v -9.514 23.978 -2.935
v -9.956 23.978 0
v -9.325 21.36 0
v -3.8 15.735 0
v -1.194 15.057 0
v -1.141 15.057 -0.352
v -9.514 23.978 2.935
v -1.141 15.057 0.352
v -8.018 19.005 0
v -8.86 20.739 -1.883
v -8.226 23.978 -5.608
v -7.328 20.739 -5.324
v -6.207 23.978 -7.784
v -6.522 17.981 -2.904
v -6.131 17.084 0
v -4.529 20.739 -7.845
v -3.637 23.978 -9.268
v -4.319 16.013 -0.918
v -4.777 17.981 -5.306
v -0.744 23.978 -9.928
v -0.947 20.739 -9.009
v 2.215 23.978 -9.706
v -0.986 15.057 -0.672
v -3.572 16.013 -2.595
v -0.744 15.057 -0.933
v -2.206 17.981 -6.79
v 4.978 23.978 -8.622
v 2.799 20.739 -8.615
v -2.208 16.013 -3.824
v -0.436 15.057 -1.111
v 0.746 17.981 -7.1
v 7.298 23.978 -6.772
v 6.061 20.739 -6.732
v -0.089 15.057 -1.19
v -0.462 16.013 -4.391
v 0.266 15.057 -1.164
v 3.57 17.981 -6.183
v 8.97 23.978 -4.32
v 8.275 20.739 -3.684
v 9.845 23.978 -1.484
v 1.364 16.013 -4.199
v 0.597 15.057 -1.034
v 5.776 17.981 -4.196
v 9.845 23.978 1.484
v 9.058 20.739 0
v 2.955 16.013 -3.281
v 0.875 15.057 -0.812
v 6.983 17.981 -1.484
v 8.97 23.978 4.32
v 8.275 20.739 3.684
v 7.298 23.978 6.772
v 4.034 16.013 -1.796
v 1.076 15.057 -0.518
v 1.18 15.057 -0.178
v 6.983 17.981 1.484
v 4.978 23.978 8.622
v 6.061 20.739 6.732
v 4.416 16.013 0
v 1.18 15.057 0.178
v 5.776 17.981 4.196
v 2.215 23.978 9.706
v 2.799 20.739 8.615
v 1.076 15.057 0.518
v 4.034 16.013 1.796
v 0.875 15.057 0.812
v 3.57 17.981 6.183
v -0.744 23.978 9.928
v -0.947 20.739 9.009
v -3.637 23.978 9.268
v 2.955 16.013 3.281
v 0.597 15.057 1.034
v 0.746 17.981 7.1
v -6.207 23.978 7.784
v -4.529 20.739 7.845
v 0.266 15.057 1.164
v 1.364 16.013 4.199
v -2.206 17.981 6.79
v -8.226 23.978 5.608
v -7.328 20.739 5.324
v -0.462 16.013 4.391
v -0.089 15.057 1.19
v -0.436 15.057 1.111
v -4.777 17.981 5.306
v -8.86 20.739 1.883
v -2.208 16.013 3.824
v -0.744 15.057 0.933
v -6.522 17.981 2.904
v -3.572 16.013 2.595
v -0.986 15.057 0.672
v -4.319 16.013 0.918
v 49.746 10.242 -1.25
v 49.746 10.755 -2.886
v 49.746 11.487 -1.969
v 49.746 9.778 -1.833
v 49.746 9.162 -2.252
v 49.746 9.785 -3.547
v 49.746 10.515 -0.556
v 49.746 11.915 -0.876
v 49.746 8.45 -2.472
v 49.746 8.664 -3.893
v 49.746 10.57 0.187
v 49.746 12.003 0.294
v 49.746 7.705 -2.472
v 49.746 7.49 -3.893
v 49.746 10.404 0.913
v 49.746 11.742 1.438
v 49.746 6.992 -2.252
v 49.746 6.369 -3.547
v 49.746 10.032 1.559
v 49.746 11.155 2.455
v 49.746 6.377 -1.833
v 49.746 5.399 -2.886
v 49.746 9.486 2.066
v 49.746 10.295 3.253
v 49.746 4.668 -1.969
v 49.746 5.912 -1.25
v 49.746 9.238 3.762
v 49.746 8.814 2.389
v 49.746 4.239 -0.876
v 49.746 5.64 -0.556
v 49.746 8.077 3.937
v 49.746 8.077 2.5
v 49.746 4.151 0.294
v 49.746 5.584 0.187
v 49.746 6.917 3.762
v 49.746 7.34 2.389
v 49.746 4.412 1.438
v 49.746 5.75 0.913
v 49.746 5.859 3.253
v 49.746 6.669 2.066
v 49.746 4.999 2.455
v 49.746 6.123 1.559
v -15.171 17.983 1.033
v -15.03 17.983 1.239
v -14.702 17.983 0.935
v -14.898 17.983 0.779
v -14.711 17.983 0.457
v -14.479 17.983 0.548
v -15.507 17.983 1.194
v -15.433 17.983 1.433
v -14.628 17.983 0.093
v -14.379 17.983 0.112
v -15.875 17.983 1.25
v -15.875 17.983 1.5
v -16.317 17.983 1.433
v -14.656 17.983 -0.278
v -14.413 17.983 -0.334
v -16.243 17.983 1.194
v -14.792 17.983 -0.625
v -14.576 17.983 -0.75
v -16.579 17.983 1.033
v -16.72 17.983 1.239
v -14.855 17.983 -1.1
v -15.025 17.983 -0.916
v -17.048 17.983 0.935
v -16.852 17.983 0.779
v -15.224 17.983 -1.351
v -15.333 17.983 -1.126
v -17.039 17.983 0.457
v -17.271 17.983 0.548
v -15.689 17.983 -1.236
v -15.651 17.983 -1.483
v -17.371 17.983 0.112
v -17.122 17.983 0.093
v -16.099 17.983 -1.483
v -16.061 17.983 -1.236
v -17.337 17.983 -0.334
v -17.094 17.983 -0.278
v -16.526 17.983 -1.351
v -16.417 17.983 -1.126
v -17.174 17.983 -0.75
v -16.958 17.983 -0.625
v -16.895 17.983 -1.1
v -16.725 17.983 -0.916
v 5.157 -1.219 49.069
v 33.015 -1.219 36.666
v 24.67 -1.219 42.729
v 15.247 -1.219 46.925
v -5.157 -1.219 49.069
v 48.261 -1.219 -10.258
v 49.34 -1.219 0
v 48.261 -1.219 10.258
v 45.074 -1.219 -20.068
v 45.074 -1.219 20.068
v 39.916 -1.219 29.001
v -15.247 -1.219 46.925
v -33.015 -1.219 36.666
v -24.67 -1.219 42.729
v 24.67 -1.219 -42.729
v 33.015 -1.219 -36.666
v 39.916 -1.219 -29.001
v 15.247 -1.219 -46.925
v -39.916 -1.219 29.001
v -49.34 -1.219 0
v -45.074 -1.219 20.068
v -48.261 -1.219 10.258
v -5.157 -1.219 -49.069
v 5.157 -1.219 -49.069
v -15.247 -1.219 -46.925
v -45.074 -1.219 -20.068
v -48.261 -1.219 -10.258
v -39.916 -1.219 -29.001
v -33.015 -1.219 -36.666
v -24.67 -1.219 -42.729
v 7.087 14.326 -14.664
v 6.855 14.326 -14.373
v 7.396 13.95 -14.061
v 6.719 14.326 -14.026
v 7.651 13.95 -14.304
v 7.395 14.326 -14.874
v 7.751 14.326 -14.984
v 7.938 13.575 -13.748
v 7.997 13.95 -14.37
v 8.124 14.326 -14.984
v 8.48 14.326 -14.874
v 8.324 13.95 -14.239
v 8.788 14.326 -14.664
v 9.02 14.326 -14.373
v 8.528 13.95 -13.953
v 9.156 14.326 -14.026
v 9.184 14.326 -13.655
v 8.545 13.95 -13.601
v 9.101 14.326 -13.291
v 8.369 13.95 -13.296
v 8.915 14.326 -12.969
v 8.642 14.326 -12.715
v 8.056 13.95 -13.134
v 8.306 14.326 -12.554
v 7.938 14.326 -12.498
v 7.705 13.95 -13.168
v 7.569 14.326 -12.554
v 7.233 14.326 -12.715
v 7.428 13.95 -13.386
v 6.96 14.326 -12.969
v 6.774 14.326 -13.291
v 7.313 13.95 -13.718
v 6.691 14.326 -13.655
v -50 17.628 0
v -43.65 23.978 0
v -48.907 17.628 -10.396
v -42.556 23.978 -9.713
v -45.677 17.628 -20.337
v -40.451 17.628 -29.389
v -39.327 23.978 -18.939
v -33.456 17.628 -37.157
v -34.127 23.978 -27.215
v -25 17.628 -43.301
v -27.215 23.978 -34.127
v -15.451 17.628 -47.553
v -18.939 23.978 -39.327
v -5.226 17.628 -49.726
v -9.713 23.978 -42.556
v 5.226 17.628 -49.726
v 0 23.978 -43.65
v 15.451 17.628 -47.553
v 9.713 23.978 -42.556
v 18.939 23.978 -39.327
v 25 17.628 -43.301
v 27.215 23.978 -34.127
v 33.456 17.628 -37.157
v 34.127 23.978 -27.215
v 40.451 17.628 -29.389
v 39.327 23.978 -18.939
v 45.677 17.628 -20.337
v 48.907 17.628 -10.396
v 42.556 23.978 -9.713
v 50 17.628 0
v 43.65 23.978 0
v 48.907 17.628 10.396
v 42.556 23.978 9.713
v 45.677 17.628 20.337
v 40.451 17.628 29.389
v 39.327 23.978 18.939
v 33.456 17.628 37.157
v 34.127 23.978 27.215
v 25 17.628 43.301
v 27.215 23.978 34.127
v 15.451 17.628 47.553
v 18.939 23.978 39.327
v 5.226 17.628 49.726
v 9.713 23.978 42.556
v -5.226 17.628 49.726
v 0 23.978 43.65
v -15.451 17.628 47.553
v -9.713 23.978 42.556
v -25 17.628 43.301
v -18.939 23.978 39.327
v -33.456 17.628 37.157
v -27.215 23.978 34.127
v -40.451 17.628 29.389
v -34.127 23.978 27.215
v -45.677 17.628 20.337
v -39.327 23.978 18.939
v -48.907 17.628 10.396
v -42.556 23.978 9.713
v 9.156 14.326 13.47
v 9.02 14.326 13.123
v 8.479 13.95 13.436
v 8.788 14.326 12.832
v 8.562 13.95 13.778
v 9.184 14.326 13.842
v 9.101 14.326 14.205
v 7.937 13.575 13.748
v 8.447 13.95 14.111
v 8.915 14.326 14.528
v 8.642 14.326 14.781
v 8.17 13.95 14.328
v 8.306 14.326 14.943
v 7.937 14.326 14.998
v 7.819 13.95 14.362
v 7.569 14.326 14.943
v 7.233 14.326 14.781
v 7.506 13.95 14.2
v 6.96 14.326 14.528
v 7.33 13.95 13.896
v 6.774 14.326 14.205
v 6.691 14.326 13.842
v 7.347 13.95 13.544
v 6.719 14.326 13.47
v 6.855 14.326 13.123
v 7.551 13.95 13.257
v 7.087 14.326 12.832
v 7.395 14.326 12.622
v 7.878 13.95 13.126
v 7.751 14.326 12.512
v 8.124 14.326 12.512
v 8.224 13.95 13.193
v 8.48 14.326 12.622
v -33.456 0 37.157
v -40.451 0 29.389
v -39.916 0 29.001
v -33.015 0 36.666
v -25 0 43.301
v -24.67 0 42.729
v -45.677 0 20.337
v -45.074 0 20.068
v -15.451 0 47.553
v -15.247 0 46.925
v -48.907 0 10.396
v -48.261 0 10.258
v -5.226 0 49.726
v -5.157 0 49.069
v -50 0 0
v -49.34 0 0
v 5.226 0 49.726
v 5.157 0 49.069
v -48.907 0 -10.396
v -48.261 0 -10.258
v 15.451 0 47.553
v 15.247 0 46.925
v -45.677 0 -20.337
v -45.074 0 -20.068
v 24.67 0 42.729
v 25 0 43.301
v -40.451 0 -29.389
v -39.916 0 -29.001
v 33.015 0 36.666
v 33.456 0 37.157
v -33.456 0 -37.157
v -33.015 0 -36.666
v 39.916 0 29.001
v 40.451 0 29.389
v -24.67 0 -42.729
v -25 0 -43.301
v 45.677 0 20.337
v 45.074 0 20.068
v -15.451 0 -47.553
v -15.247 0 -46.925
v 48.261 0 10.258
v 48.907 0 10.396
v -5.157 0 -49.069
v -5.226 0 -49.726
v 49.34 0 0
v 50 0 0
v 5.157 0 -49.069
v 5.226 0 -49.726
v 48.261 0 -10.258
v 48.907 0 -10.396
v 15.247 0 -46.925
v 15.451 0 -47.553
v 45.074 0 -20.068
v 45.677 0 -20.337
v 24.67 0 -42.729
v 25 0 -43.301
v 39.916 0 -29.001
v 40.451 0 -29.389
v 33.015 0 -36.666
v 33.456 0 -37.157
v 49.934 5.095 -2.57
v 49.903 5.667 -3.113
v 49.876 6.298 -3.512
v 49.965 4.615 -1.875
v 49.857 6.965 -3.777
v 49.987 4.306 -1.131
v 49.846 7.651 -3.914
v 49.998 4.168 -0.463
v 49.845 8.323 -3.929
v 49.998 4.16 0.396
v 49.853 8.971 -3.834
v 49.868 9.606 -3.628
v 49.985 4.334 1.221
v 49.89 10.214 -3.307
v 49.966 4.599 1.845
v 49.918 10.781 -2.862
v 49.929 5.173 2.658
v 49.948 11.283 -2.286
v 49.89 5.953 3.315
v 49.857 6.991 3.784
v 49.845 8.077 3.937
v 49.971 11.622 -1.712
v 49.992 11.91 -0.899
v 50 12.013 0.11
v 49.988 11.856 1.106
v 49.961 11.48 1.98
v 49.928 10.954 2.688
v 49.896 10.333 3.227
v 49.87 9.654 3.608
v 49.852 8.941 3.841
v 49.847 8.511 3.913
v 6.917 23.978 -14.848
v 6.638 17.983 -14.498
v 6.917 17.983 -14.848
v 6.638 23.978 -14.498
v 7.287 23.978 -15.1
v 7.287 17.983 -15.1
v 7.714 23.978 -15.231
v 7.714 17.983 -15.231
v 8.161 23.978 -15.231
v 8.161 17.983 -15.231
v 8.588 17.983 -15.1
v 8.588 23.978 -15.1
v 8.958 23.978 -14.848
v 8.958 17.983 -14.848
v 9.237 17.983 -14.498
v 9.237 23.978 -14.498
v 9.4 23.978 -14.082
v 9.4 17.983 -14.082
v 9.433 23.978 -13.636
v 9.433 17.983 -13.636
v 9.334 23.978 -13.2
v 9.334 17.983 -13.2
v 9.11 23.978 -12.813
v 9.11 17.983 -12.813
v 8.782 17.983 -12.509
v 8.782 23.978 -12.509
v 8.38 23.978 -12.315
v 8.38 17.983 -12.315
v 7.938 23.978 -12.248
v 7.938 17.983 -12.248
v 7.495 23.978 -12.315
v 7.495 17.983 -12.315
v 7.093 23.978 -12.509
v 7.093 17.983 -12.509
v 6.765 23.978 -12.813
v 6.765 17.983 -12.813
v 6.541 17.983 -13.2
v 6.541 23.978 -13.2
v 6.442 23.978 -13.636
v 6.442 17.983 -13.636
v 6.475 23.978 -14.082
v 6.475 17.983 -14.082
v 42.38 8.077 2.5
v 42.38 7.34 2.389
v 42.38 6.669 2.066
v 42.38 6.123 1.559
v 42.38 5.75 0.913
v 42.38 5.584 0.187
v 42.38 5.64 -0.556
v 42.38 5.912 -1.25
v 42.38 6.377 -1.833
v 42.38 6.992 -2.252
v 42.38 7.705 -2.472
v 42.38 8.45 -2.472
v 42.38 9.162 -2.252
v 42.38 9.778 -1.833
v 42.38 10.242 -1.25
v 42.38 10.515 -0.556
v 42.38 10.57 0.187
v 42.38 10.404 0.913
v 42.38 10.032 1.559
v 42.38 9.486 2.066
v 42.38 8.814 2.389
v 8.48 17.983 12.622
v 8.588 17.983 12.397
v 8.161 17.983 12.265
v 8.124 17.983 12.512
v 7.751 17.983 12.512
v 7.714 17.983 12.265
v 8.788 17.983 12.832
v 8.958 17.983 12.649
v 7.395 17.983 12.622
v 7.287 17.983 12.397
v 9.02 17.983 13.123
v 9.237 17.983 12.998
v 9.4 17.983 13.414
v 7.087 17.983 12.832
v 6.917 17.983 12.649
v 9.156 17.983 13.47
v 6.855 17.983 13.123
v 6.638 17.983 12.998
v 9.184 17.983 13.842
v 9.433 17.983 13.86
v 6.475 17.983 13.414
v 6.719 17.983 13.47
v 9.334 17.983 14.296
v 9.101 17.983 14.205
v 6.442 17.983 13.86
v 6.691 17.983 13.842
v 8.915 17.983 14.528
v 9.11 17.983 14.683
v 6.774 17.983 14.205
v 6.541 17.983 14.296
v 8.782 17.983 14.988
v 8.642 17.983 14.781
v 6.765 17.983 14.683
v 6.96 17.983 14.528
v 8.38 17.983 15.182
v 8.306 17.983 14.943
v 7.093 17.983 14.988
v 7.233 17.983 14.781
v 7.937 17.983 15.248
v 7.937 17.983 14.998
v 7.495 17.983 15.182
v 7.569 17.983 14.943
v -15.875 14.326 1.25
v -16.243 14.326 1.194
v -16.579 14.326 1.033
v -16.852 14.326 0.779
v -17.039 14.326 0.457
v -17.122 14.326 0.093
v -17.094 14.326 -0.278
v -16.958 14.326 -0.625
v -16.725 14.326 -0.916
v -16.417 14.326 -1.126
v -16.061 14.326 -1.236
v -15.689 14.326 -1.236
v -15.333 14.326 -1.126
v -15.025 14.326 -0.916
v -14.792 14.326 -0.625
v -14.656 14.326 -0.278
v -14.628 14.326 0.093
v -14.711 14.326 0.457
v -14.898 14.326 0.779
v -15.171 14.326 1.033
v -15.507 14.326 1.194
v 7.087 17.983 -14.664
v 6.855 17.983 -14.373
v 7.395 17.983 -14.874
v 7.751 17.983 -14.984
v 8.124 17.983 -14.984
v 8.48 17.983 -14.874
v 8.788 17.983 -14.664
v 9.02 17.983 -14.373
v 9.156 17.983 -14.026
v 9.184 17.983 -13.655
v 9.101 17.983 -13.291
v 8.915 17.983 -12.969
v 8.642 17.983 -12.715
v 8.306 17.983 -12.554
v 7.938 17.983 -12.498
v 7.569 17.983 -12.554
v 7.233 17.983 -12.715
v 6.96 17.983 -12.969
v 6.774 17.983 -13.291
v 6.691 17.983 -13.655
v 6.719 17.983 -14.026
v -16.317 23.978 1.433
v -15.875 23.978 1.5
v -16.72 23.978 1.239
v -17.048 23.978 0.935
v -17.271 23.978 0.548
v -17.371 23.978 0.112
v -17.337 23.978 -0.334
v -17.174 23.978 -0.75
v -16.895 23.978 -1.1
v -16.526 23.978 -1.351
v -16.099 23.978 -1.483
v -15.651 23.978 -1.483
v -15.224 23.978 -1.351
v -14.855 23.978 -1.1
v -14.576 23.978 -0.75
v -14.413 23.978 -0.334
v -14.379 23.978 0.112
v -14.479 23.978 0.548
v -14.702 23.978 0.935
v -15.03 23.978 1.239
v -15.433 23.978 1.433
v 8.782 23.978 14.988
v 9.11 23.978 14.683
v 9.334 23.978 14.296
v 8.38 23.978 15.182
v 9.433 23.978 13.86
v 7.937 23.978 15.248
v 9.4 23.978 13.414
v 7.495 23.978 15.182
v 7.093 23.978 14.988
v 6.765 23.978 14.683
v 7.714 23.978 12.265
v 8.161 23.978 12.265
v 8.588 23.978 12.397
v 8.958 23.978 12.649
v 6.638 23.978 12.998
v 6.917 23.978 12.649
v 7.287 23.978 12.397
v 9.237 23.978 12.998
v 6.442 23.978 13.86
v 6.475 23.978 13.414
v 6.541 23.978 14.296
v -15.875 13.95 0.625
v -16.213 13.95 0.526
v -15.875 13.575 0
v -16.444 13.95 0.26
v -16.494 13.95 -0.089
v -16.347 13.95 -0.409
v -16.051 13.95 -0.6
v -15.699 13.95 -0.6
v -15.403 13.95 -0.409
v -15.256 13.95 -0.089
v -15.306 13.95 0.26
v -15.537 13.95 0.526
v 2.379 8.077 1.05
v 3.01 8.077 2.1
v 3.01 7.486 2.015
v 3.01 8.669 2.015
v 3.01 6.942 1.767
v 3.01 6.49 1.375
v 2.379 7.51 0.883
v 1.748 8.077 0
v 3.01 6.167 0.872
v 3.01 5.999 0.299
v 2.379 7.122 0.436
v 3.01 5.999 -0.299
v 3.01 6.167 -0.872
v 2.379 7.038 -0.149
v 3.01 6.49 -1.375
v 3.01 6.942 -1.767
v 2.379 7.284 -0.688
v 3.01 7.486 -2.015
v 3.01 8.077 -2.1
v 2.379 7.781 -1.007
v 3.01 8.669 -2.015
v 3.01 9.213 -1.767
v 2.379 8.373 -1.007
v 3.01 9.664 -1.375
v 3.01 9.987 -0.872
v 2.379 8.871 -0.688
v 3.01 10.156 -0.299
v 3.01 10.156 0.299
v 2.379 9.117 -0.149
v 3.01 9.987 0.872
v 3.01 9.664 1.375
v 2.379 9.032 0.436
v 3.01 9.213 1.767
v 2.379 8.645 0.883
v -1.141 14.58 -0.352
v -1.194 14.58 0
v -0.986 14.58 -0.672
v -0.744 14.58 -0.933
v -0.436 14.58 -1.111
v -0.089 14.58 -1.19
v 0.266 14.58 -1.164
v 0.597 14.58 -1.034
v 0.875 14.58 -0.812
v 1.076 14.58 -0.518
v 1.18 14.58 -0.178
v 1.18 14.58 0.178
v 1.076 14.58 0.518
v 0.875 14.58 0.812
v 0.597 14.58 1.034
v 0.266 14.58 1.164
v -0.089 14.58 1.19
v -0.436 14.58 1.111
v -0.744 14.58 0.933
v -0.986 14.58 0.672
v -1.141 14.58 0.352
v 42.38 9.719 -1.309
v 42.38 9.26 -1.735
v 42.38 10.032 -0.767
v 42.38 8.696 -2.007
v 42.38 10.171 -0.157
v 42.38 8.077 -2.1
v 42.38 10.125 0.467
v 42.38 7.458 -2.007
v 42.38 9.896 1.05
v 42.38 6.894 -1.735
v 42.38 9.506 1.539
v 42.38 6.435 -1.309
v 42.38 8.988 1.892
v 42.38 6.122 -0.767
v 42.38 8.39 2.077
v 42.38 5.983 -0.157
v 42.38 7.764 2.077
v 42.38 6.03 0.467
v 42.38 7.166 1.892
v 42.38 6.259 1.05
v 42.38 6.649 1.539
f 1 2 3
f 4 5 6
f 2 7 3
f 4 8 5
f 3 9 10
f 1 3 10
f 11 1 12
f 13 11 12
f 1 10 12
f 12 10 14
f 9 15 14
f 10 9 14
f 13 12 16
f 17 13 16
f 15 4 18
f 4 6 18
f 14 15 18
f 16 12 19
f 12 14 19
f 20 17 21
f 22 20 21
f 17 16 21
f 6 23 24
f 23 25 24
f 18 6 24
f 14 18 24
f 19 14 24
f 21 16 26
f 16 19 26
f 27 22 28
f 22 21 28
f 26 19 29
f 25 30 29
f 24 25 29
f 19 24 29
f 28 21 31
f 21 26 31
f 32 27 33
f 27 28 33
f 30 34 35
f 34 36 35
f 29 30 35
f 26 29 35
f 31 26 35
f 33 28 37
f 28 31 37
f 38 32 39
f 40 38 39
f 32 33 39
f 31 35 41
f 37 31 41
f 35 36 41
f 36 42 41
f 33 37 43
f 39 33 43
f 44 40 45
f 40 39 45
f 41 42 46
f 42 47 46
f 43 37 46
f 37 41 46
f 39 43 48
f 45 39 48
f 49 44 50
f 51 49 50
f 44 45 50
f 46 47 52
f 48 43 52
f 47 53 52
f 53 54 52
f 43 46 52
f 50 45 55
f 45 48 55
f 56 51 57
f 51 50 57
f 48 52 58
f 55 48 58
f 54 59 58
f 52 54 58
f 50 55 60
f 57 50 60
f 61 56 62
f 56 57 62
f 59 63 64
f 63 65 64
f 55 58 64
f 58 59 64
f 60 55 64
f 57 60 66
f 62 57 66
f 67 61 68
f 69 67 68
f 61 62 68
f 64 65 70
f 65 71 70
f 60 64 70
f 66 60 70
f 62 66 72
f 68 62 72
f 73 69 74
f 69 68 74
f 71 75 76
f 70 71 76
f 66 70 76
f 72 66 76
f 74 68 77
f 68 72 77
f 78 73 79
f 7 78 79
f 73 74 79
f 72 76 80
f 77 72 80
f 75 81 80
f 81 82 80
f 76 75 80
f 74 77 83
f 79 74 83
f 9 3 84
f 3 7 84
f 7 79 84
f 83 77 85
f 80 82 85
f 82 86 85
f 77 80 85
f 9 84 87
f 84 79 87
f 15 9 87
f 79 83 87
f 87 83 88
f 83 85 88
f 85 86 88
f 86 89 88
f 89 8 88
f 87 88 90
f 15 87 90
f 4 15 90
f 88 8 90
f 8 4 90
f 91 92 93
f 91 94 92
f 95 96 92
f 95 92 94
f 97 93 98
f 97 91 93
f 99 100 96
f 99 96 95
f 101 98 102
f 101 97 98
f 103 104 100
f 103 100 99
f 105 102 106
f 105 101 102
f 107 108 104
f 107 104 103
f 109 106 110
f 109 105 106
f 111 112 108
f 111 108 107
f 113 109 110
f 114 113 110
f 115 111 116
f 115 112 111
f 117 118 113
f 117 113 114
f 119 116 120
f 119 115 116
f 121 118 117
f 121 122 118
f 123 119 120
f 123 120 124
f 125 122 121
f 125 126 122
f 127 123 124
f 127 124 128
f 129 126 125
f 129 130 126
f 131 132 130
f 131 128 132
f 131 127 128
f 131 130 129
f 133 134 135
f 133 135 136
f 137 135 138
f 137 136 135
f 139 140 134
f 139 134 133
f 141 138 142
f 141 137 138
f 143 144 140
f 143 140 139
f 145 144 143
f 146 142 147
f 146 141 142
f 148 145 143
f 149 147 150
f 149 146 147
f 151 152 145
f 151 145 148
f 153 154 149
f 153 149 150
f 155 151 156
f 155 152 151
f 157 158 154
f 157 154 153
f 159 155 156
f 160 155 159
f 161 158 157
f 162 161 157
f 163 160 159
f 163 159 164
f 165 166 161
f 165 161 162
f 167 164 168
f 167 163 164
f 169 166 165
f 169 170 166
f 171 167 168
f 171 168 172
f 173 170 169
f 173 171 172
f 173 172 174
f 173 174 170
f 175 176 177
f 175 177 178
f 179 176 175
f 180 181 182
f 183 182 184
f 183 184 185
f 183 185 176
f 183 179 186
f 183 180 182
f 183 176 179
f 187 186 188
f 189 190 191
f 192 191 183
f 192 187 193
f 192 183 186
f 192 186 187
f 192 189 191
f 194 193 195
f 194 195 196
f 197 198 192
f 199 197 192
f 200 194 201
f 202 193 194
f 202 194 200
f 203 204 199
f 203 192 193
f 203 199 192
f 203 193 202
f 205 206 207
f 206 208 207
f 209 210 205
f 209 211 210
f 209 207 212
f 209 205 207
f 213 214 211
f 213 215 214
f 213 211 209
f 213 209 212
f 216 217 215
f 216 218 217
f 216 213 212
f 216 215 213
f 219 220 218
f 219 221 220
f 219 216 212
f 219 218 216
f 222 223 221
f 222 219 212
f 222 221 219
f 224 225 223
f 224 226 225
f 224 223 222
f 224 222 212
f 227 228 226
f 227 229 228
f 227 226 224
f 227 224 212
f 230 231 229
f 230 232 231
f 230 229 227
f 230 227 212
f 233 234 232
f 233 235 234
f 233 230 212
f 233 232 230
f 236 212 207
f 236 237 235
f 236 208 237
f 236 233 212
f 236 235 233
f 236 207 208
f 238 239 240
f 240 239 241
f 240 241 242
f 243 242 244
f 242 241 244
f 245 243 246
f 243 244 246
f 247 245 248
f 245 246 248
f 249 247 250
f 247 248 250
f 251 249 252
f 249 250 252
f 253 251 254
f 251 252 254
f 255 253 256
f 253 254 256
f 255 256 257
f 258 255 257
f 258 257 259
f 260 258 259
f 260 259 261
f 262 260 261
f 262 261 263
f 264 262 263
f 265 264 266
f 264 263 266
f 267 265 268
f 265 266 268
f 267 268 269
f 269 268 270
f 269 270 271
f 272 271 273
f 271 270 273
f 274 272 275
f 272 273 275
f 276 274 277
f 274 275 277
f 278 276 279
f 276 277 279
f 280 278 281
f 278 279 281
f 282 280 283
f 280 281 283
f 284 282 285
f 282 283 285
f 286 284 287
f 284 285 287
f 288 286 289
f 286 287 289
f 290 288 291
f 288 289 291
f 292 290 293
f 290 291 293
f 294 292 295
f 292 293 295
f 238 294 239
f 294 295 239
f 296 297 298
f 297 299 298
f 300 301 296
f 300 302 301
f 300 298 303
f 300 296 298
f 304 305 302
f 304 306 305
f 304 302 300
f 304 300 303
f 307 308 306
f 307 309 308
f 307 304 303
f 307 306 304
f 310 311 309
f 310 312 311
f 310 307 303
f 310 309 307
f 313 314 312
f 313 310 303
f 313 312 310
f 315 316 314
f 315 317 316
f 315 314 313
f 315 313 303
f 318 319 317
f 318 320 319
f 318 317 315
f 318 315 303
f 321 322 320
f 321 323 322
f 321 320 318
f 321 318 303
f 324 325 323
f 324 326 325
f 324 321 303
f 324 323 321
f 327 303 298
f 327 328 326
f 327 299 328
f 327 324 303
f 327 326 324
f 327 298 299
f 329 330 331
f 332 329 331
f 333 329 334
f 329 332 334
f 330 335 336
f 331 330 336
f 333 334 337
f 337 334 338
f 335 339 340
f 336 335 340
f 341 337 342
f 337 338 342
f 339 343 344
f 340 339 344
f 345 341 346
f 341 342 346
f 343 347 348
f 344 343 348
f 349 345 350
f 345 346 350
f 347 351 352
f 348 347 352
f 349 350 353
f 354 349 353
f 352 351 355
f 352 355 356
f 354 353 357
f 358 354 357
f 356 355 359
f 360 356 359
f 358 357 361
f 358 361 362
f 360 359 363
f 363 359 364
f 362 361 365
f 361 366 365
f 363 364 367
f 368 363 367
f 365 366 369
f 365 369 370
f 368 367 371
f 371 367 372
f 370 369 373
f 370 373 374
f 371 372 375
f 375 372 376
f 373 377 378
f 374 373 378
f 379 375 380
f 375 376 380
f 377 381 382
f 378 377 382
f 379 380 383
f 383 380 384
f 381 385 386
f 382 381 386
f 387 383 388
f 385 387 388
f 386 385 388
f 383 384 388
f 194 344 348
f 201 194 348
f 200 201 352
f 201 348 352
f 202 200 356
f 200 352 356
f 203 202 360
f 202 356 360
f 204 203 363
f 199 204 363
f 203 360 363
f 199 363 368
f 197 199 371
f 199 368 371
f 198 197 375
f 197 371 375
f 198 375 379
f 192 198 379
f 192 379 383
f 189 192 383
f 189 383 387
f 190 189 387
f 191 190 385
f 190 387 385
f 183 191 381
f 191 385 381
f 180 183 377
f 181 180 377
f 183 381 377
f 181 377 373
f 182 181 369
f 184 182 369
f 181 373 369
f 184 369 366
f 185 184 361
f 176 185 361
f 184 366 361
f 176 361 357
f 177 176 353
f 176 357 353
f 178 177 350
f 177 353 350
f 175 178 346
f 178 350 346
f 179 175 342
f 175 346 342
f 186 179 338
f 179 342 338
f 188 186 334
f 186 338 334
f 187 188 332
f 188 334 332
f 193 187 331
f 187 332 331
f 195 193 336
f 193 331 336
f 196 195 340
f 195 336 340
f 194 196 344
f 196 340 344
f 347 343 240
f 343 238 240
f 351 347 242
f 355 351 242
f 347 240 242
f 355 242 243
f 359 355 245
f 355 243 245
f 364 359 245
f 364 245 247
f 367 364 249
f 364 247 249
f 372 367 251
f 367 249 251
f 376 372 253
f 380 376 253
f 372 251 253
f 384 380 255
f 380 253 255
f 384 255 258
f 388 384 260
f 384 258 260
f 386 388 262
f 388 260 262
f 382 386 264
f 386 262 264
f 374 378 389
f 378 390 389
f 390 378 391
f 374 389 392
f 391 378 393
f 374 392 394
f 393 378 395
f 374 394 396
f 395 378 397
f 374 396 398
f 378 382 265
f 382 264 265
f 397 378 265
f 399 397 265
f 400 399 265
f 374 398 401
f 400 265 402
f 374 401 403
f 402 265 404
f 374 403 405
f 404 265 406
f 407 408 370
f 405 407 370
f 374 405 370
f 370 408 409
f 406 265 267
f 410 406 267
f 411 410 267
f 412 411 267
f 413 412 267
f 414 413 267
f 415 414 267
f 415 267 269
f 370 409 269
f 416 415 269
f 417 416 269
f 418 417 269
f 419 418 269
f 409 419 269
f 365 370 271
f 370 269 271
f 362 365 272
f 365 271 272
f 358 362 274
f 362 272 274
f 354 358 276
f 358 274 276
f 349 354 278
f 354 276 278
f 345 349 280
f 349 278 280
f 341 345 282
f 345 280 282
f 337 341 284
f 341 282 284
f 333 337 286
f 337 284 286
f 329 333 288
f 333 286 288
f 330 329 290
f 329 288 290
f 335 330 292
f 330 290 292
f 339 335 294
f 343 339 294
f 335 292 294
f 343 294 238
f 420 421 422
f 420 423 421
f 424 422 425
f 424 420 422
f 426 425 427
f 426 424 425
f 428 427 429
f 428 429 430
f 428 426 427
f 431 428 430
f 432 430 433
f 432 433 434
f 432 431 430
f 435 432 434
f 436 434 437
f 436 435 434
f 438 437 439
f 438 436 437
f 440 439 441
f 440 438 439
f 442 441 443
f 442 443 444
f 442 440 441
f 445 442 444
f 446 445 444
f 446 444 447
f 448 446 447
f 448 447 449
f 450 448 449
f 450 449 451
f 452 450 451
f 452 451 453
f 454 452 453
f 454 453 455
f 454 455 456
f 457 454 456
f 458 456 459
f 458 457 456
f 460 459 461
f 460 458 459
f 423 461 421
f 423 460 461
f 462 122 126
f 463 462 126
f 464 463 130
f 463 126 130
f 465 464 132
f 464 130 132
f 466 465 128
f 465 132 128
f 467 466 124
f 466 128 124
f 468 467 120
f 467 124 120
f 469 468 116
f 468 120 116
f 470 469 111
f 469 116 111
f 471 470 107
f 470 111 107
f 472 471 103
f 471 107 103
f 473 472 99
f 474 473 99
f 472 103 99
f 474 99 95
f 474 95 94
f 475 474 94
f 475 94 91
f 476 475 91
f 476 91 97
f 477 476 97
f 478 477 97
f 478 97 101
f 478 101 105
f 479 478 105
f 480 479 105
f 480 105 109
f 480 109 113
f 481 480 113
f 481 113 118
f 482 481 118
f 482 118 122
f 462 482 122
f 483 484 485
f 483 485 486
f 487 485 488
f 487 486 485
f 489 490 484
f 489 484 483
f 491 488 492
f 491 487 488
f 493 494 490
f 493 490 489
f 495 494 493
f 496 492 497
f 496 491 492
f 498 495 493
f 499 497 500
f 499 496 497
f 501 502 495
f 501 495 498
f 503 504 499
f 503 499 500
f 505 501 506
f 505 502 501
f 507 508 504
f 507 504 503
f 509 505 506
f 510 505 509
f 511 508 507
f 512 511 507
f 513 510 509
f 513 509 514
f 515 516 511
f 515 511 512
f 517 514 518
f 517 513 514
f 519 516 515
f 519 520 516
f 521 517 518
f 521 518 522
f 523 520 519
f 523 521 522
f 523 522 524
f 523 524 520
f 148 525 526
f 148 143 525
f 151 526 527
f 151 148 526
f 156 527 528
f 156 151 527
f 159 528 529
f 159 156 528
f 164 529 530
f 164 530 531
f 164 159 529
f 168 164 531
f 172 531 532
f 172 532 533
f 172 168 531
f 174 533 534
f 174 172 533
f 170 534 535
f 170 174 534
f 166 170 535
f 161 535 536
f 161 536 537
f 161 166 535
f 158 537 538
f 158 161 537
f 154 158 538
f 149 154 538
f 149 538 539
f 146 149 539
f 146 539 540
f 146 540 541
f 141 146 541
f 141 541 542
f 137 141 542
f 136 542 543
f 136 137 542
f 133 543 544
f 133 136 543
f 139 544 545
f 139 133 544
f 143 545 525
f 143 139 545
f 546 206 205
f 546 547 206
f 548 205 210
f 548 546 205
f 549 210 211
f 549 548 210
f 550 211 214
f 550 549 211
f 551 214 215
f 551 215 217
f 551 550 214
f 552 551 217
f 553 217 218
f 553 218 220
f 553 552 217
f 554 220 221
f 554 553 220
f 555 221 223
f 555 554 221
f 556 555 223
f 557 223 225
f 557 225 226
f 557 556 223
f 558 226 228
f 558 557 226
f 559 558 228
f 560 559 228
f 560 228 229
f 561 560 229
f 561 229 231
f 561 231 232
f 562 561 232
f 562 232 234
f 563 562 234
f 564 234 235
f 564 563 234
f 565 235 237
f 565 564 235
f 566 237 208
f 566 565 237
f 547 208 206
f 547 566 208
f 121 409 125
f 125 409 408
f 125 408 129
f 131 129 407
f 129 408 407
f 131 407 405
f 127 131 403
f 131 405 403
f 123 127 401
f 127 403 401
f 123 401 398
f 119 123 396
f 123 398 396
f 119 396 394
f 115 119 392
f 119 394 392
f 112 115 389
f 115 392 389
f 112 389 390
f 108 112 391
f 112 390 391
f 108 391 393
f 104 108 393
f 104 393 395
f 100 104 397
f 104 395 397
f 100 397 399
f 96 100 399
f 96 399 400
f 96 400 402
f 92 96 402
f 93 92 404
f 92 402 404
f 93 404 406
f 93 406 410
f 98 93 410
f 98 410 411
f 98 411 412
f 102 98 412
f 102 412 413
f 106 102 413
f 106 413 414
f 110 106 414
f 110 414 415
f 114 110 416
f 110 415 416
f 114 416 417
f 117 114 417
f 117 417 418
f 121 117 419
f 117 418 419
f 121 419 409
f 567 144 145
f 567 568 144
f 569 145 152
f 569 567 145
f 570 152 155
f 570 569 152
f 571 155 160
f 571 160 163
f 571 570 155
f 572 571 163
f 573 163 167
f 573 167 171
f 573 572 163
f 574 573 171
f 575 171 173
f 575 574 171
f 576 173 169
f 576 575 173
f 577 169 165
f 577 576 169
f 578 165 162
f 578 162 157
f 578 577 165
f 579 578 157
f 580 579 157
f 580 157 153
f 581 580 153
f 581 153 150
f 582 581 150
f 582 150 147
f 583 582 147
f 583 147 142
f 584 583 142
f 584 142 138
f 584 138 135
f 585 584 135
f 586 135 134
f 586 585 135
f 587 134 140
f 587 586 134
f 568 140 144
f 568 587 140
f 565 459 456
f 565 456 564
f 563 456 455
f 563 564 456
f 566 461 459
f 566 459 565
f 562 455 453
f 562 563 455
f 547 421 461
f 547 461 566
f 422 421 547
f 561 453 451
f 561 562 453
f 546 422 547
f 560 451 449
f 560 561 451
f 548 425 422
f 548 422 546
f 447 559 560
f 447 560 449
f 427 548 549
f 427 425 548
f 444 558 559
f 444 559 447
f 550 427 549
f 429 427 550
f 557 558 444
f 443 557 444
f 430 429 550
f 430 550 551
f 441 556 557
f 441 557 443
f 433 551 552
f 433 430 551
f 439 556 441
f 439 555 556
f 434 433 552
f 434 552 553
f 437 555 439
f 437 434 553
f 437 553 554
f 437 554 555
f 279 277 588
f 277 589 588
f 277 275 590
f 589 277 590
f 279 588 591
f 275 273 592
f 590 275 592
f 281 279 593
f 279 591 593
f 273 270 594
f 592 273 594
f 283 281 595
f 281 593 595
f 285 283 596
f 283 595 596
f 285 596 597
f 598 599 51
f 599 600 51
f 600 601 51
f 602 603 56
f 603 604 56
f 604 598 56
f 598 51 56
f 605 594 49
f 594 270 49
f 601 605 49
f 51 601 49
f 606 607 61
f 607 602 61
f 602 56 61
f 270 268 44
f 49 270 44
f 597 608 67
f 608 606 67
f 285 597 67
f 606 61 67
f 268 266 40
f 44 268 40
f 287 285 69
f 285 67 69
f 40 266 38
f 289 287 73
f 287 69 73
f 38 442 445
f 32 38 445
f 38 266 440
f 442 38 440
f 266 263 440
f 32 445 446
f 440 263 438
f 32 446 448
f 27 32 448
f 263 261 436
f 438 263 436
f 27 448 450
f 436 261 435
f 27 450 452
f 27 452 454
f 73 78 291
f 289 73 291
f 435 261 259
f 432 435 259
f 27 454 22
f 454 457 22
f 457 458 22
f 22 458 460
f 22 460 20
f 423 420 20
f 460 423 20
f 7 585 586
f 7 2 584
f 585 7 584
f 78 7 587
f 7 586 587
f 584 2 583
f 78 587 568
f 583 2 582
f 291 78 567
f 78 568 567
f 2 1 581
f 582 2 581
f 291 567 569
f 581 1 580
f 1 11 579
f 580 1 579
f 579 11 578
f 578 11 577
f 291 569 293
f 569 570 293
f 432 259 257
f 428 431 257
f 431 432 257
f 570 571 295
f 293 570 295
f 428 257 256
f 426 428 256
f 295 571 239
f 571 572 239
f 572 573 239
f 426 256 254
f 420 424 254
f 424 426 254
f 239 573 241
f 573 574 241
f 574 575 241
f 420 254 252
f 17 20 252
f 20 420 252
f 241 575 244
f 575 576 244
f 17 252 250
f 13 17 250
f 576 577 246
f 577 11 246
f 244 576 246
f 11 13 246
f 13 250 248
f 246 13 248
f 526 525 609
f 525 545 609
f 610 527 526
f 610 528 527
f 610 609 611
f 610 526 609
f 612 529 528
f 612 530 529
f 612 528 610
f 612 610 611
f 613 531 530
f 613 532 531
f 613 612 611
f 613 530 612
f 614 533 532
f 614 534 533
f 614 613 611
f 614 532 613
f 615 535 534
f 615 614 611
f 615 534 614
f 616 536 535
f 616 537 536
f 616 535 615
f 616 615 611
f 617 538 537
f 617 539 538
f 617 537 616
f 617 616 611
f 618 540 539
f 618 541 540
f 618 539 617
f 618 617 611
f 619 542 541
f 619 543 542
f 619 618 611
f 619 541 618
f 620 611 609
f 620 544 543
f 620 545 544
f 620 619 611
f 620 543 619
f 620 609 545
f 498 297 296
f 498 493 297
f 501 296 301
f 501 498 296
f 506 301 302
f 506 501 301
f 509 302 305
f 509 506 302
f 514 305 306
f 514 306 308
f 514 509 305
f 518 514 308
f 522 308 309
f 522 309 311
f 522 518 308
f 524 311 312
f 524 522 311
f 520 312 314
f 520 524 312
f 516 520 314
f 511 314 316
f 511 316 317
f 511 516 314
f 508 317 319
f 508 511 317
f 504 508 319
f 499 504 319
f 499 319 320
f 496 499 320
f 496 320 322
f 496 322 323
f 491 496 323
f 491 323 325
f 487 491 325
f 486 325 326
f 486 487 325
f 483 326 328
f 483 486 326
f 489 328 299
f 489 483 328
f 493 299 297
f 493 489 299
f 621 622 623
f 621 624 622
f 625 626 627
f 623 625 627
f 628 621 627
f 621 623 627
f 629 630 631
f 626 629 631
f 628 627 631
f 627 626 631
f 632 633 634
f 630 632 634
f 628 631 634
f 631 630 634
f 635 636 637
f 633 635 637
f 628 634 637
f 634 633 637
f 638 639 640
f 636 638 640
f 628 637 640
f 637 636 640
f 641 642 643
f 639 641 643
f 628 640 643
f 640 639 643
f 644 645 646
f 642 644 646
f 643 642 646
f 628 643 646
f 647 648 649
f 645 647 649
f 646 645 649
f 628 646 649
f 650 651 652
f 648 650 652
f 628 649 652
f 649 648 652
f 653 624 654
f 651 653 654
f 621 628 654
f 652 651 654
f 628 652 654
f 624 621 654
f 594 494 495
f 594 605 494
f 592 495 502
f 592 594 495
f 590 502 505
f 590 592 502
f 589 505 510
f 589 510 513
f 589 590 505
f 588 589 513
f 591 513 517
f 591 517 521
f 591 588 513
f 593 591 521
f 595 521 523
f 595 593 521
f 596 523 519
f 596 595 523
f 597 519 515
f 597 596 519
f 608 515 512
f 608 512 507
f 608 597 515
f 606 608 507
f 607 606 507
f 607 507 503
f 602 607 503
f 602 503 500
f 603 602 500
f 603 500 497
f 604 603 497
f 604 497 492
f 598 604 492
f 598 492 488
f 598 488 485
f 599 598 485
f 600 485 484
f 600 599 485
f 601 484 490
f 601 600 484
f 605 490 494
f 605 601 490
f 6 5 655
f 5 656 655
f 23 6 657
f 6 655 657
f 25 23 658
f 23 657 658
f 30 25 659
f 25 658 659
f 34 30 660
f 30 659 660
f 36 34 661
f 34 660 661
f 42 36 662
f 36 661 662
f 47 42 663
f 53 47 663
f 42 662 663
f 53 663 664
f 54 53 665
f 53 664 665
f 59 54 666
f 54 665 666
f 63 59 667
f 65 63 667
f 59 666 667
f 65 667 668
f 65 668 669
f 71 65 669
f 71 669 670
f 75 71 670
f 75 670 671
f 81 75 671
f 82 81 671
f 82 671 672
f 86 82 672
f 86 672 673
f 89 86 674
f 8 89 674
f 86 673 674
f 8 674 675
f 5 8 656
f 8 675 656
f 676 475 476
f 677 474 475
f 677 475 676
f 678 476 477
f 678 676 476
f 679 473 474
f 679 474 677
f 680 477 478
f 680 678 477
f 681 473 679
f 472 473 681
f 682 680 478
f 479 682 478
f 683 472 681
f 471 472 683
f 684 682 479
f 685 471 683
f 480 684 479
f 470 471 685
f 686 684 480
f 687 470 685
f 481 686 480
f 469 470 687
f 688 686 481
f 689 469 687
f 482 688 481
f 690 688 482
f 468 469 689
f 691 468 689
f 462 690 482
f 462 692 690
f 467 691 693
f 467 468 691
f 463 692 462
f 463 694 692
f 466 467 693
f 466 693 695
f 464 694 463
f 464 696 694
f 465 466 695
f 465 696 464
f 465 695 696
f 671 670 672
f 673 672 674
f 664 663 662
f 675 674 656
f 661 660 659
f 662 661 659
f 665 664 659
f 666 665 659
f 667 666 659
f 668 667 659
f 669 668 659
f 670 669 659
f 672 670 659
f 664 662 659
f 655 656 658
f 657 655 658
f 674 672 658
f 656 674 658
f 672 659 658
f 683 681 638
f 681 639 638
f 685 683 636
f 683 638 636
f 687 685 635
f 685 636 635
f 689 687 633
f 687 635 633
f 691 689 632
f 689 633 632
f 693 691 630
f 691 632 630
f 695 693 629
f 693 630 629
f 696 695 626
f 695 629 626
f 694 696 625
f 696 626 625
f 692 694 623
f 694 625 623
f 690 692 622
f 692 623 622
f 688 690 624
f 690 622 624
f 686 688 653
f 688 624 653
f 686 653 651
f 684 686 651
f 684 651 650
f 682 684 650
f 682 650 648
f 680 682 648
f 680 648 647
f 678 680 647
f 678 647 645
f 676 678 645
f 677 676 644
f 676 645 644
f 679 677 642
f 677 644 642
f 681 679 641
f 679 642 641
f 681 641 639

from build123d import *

# Parameters (mm, degrees)
M5X0_8_TAPPED_HOLE1_D                               = 4.2
M5X0_8_TAPPED_HOLE1_DEPTH                           = 46.99
M5X0_8_TAPPED_HOLE1_CBORE_D                         = 5
M5X0_8_TAPPED_HOLE1_CBORE_DEPTH                     = 7.62
M5X0_8_TAPPED_HOLE1_TIP                             = 1.2618073
CIRPATTERN1_COUNT                                   = 3
CBORE_FOR_00_BINDING_HEAD_MACHINE_SCREW_D           = 1.397
CBORE_FOR_00_BINDING_HEAD_MACHINE_SCREW_DEPTH       = 6.35
CBORE_FOR_00_BINDING_HEAD_MACHINE_SCREW_CBORE_D     = 7.874
CBORE_FOR_00_BINDING_HEAD_MACHINE_SCREW_CBORE_DEPTH = 0.254
CBORE_FOR_00_BINDING_HEAD_MACHINE_SCREW_TIP         = 0.419701142
SKETCH2_R                                           = 49.3395
EXTRUDE1_DEPTH                                      = 1.2192


with BuildPart() as part:
    # Sketch1 → Revolve1 (revolve)
    with BuildSketch(Plane.XY, mode=Mode.PRIVATE) as revolve1_sk:
        with BuildLine():
            Line((0, 0), (49.9999, 0))
            Line((49.9999, 0), (49.9999, 17.6276))
            Line((49.9999, 17.6276), (43.6499, 23.9776))
            Line((43.6499, 23.9776), (9.955892816, 23.9776))
            ThreePointArc((9.955892816, 23.9776), (7.139407653, 17.980689326), (1.1938, 15.057458932))
            Line((1.1938, 15.057458932), (1.1938, 14.5796))
            Line((1.1938, 14.5796), (0, 14.5796))
            Line((0, 14.5796), (0, 0))
        make_face()
    revolve(revolve1_sk.sketch.rotate(Axis((0, 23.9776, 0), (0, -1, 0)), 180), axis=Axis((0, 23.9776, 0), (0, -1, 0)))  # turned: the seam where the file's is

    # M5x0.8 Tapped Hole1
    with Locations(Plane(origin=(49.9999, 8.0772, 0), x_dir=(0, 0, 1), z_dir=(1, 0, 0))):
        with Locations((0, 0)):
            CounterBoreHole(M5X0_8_TAPPED_HOLE1_D / 2, M5X0_8_TAPPED_HOLE1_CBORE_D / 2, M5X0_8_TAPPED_HOLE1_CBORE_DEPTH, depth=M5X0_8_TAPPED_HOLE1_DEPTH)
            with Locations((0, 0, -(M5X0_8_TAPPED_HOLE1_DEPTH + M5X0_8_TAPPED_HOLE1_TIP / 2))):  # 118° drill point
                Cone(0, M5X0_8_TAPPED_HOLE1_D / 2, M5X0_8_TAPPED_HOLE1_TIP, mode=Mode.SUBTRACT)

    # Sketch5 → M3x0.5 Tapped Hole1 (revolve, cut)
    with BuildSketch(Plane(origin=(-15.875, 23.9776, 0), x_dir=(0, 0, 1), z_dir=(1, 0, 0))):
        Polygon((0, 0), (0, 10.403075774), (1.25, 9.652), (1.25, 5.9944), (1.5, 5.9944), (1.5, 0), align=None)
    m3x0_5_tapped_hole1 = revolve(axis=Axis((-15.875, 30.3276, 0), (0, -1, 0)), mode=Mode.SUBTRACT)

    # CirPattern1: M3x0.5 Tapped Hole1 ×3 about axis
    cirpattern1_axis = Axis((0, 0, 0), (0, 1, 0))
    for i in range(1, CIRPATTERN1_COUNT):
        add(m3x0_5_tapped_hole1.rotate(cirpattern1_axis, i * 360 / CIRPATTERN1_COUNT), mode=Mode.SUBTRACT)

    # CBORE for #00 Binding Head Machine Screw1
    with Locations(Plane(origin=(49.9999, 8.0772, 0), x_dir=(0, 0, 1), z_dir=(1, 0, 0))):
        with Locations((0, 0)):
            CounterBoreHole(CBORE_FOR_00_BINDING_HEAD_MACHINE_SCREW_D / 2, CBORE_FOR_00_BINDING_HEAD_MACHINE_SCREW_CBORE_D / 2, CBORE_FOR_00_BINDING_HEAD_MACHINE_SCREW_CBORE_DEPTH, depth=CBORE_FOR_00_BINDING_HEAD_MACHINE_SCREW_DEPTH)
            with Locations((0, 0, -(CBORE_FOR_00_BINDING_HEAD_MACHINE_SCREW_DEPTH + CBORE_FOR_00_BINDING_HEAD_MACHINE_SCREW_TIP / 2))):  # 118° drill point
                Cone(0, CBORE_FOR_00_BINDING_HEAD_MACHINE_SCREW_D / 2, CBORE_FOR_00_BINDING_HEAD_MACHINE_SCREW_TIP, mode=Mode.SUBTRACT)

    # Sketch2 → Extrude1 (add)
    with BuildSketch(Plane.XZ):
        with Locations(Location((0, 0, 0), (0, 0, 180))):  # turned: the seam where the file's is
            Circle(SKETCH2_R)
    extrude(amount=EXTRUDE1_DEPTH)


solid = part.part
